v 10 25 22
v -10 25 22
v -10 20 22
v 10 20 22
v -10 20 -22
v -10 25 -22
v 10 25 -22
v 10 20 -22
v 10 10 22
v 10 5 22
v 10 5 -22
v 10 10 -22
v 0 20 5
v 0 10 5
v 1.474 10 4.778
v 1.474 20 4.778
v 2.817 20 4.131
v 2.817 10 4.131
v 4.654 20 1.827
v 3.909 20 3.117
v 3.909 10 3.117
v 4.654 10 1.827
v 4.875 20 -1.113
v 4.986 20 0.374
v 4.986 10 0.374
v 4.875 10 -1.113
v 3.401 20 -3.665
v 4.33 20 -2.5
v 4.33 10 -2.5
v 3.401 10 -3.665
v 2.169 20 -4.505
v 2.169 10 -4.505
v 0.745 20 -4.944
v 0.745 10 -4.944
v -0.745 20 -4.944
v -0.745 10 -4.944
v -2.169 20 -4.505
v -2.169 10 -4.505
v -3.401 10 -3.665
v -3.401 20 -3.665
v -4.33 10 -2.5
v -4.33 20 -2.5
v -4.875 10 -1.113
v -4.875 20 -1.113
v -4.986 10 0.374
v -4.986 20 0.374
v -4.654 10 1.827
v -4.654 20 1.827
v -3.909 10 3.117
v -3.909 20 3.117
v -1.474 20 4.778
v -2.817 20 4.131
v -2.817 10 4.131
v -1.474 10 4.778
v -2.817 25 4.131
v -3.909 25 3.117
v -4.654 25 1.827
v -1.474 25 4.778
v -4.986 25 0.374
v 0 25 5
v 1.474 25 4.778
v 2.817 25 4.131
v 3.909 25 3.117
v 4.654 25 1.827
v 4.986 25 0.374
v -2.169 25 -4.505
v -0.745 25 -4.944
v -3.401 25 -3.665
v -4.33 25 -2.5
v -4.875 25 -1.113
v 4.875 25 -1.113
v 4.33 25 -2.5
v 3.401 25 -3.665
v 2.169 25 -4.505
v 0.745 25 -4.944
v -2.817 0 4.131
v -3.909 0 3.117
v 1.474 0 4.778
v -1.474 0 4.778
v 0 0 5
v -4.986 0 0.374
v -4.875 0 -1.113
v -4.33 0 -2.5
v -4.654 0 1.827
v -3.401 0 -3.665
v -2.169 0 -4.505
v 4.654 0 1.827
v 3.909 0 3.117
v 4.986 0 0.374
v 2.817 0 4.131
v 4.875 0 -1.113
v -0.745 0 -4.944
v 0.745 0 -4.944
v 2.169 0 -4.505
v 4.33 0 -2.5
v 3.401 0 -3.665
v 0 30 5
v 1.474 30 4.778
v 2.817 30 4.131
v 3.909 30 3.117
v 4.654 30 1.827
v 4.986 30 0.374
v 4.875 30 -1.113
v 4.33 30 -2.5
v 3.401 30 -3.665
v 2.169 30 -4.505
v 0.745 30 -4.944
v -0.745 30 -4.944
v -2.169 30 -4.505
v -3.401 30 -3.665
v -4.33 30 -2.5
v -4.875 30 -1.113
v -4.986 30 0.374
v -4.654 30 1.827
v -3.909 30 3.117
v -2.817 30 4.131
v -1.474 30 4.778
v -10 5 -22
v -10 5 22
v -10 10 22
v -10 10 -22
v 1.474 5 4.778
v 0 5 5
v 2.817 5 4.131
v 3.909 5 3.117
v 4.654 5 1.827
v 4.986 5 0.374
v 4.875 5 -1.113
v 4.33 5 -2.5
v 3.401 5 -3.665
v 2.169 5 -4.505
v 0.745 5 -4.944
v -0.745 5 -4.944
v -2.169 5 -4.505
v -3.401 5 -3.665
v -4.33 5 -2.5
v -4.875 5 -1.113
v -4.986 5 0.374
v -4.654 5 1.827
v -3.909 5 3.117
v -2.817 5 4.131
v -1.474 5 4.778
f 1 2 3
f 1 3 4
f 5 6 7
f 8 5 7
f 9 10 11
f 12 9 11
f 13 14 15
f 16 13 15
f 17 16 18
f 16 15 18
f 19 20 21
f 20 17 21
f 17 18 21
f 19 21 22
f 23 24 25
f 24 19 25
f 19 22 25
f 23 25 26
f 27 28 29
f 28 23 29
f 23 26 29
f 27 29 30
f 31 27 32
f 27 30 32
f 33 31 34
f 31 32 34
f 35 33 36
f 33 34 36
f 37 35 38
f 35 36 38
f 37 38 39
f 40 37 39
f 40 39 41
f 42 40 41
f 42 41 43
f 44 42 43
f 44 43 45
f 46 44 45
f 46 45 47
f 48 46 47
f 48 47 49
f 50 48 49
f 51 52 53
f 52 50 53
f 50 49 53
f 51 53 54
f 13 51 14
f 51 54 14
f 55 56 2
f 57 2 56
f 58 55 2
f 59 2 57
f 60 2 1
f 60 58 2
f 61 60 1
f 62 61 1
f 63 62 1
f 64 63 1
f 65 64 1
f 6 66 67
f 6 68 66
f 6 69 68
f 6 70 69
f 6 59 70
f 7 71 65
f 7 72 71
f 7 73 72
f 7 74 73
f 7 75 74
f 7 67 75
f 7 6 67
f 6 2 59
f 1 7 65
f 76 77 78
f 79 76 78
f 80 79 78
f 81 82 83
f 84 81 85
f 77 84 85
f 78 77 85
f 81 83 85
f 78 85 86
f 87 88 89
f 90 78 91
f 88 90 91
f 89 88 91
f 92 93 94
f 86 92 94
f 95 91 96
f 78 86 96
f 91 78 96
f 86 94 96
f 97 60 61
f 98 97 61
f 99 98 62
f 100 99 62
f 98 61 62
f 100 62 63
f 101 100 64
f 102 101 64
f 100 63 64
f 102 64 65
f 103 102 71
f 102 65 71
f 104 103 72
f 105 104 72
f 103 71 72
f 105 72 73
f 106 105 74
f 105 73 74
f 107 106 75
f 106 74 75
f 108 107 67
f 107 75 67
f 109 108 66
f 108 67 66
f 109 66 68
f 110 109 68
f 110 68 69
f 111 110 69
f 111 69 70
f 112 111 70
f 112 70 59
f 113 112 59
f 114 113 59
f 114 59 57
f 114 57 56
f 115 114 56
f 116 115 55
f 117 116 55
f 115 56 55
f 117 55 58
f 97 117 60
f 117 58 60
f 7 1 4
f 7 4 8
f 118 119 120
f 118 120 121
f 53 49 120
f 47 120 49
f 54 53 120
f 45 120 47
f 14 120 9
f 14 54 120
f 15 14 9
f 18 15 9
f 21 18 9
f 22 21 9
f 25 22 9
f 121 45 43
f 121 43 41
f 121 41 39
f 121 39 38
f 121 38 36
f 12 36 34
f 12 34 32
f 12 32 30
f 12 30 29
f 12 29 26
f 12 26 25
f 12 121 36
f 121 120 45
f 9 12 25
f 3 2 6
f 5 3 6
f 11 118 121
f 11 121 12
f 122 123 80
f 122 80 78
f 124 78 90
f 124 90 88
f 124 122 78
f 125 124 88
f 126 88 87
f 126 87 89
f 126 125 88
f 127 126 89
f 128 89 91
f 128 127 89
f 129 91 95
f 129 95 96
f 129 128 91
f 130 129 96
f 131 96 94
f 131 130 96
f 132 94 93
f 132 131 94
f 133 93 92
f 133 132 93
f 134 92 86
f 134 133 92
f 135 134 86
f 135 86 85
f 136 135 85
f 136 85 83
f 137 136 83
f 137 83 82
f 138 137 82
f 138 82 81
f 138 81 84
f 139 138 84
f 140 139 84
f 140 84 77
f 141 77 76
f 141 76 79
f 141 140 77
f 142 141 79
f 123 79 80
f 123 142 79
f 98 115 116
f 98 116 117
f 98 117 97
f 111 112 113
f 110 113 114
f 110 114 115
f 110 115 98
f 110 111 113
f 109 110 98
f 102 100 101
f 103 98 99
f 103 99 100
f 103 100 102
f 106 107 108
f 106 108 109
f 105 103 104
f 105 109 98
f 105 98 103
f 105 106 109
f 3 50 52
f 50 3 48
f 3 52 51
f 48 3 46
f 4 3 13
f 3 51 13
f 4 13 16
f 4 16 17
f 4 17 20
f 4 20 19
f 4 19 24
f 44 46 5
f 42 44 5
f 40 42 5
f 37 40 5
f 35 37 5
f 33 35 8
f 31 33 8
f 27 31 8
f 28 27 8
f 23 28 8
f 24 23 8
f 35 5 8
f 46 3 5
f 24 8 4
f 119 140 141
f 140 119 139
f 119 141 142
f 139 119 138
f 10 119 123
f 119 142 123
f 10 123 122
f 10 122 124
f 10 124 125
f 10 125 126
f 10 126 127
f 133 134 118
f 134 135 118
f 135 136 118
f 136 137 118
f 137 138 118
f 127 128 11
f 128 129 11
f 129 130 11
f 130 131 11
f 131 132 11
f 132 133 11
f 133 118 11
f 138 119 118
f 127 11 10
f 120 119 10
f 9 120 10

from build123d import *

# Parameters (mm, degrees)
SKETCH1_R           = 5
BOSS_EXTRUDE1_DEPTH = 30
SKETCH2_W           = 20
SKETCH2_H           = 44
BOSS_EXTRUDE2_DEPTH = 10
CUT_EXTRUDE2_START  = -5
SKETCH4_W           = 20
SKETCH4_H           = 44
SKETCH4_R           = 5
CUT_EXTRUDE2_DEPTH  = 5


with BuildPart() as part:
    # Sketch1 → Boss-Extrude1 (new body)
    with BuildSketch(Plane(origin=(0, 0, 0), x_dir=(1, 0, 0), z_dir=(0, 1, 0))):
        with Locations(Location((0, 0, 0), (0, 0, 270))):
            Circle(SKETCH1_R)
    extrude(amount=BOSS_EXTRUDE1_DEPTH)

    # Sketch2 → Boss-Extrude2 (add)
    with BuildSketch(Plane(origin=(0, 30, 0), x_dir=(1, 0, 0), z_dir=(0, 1, 0))):
        Rectangle(SKETCH2_W, SKETCH2_H)
    boss_extrude2 = extrude(amount=-BOSS_EXTRUDE2_DEPTH)

    # Sketch4 → Cut-Extrude2 (cut)
    with BuildSketch(Plane(origin=(0, 30, 0), x_dir=(1, 0, 0), z_dir=(0, 1, 0)).offset(CUT_EXTRUDE2_START)):
        Rectangle(SKETCH4_W, SKETCH4_H)
        with Locations(Location((0, 0, 0), (0, 0, 270))):
            Circle(SKETCH4_R, mode=Mode.SUBTRACT)
    cut_extrude2 = extrude(amount=CUT_EXTRUDE2_DEPTH, mode=Mode.SUBTRACT)

    # Mirror2: Boss-Extrude2, Cut-Extrude2 across plane
    add(boss_extrude2.mirror(Plane(origin=(0, 15, 0), x_dir=(0, 0, 1), z_dir=(0, -1, 0))))
    add(cut_extrude2.mirror(Plane(origin=(0, 15, 0), x_dir=(0, 0, 1), z_dir=(0, -1, 0))), mode=Mode.SUBTRACT)


solid = part.part
